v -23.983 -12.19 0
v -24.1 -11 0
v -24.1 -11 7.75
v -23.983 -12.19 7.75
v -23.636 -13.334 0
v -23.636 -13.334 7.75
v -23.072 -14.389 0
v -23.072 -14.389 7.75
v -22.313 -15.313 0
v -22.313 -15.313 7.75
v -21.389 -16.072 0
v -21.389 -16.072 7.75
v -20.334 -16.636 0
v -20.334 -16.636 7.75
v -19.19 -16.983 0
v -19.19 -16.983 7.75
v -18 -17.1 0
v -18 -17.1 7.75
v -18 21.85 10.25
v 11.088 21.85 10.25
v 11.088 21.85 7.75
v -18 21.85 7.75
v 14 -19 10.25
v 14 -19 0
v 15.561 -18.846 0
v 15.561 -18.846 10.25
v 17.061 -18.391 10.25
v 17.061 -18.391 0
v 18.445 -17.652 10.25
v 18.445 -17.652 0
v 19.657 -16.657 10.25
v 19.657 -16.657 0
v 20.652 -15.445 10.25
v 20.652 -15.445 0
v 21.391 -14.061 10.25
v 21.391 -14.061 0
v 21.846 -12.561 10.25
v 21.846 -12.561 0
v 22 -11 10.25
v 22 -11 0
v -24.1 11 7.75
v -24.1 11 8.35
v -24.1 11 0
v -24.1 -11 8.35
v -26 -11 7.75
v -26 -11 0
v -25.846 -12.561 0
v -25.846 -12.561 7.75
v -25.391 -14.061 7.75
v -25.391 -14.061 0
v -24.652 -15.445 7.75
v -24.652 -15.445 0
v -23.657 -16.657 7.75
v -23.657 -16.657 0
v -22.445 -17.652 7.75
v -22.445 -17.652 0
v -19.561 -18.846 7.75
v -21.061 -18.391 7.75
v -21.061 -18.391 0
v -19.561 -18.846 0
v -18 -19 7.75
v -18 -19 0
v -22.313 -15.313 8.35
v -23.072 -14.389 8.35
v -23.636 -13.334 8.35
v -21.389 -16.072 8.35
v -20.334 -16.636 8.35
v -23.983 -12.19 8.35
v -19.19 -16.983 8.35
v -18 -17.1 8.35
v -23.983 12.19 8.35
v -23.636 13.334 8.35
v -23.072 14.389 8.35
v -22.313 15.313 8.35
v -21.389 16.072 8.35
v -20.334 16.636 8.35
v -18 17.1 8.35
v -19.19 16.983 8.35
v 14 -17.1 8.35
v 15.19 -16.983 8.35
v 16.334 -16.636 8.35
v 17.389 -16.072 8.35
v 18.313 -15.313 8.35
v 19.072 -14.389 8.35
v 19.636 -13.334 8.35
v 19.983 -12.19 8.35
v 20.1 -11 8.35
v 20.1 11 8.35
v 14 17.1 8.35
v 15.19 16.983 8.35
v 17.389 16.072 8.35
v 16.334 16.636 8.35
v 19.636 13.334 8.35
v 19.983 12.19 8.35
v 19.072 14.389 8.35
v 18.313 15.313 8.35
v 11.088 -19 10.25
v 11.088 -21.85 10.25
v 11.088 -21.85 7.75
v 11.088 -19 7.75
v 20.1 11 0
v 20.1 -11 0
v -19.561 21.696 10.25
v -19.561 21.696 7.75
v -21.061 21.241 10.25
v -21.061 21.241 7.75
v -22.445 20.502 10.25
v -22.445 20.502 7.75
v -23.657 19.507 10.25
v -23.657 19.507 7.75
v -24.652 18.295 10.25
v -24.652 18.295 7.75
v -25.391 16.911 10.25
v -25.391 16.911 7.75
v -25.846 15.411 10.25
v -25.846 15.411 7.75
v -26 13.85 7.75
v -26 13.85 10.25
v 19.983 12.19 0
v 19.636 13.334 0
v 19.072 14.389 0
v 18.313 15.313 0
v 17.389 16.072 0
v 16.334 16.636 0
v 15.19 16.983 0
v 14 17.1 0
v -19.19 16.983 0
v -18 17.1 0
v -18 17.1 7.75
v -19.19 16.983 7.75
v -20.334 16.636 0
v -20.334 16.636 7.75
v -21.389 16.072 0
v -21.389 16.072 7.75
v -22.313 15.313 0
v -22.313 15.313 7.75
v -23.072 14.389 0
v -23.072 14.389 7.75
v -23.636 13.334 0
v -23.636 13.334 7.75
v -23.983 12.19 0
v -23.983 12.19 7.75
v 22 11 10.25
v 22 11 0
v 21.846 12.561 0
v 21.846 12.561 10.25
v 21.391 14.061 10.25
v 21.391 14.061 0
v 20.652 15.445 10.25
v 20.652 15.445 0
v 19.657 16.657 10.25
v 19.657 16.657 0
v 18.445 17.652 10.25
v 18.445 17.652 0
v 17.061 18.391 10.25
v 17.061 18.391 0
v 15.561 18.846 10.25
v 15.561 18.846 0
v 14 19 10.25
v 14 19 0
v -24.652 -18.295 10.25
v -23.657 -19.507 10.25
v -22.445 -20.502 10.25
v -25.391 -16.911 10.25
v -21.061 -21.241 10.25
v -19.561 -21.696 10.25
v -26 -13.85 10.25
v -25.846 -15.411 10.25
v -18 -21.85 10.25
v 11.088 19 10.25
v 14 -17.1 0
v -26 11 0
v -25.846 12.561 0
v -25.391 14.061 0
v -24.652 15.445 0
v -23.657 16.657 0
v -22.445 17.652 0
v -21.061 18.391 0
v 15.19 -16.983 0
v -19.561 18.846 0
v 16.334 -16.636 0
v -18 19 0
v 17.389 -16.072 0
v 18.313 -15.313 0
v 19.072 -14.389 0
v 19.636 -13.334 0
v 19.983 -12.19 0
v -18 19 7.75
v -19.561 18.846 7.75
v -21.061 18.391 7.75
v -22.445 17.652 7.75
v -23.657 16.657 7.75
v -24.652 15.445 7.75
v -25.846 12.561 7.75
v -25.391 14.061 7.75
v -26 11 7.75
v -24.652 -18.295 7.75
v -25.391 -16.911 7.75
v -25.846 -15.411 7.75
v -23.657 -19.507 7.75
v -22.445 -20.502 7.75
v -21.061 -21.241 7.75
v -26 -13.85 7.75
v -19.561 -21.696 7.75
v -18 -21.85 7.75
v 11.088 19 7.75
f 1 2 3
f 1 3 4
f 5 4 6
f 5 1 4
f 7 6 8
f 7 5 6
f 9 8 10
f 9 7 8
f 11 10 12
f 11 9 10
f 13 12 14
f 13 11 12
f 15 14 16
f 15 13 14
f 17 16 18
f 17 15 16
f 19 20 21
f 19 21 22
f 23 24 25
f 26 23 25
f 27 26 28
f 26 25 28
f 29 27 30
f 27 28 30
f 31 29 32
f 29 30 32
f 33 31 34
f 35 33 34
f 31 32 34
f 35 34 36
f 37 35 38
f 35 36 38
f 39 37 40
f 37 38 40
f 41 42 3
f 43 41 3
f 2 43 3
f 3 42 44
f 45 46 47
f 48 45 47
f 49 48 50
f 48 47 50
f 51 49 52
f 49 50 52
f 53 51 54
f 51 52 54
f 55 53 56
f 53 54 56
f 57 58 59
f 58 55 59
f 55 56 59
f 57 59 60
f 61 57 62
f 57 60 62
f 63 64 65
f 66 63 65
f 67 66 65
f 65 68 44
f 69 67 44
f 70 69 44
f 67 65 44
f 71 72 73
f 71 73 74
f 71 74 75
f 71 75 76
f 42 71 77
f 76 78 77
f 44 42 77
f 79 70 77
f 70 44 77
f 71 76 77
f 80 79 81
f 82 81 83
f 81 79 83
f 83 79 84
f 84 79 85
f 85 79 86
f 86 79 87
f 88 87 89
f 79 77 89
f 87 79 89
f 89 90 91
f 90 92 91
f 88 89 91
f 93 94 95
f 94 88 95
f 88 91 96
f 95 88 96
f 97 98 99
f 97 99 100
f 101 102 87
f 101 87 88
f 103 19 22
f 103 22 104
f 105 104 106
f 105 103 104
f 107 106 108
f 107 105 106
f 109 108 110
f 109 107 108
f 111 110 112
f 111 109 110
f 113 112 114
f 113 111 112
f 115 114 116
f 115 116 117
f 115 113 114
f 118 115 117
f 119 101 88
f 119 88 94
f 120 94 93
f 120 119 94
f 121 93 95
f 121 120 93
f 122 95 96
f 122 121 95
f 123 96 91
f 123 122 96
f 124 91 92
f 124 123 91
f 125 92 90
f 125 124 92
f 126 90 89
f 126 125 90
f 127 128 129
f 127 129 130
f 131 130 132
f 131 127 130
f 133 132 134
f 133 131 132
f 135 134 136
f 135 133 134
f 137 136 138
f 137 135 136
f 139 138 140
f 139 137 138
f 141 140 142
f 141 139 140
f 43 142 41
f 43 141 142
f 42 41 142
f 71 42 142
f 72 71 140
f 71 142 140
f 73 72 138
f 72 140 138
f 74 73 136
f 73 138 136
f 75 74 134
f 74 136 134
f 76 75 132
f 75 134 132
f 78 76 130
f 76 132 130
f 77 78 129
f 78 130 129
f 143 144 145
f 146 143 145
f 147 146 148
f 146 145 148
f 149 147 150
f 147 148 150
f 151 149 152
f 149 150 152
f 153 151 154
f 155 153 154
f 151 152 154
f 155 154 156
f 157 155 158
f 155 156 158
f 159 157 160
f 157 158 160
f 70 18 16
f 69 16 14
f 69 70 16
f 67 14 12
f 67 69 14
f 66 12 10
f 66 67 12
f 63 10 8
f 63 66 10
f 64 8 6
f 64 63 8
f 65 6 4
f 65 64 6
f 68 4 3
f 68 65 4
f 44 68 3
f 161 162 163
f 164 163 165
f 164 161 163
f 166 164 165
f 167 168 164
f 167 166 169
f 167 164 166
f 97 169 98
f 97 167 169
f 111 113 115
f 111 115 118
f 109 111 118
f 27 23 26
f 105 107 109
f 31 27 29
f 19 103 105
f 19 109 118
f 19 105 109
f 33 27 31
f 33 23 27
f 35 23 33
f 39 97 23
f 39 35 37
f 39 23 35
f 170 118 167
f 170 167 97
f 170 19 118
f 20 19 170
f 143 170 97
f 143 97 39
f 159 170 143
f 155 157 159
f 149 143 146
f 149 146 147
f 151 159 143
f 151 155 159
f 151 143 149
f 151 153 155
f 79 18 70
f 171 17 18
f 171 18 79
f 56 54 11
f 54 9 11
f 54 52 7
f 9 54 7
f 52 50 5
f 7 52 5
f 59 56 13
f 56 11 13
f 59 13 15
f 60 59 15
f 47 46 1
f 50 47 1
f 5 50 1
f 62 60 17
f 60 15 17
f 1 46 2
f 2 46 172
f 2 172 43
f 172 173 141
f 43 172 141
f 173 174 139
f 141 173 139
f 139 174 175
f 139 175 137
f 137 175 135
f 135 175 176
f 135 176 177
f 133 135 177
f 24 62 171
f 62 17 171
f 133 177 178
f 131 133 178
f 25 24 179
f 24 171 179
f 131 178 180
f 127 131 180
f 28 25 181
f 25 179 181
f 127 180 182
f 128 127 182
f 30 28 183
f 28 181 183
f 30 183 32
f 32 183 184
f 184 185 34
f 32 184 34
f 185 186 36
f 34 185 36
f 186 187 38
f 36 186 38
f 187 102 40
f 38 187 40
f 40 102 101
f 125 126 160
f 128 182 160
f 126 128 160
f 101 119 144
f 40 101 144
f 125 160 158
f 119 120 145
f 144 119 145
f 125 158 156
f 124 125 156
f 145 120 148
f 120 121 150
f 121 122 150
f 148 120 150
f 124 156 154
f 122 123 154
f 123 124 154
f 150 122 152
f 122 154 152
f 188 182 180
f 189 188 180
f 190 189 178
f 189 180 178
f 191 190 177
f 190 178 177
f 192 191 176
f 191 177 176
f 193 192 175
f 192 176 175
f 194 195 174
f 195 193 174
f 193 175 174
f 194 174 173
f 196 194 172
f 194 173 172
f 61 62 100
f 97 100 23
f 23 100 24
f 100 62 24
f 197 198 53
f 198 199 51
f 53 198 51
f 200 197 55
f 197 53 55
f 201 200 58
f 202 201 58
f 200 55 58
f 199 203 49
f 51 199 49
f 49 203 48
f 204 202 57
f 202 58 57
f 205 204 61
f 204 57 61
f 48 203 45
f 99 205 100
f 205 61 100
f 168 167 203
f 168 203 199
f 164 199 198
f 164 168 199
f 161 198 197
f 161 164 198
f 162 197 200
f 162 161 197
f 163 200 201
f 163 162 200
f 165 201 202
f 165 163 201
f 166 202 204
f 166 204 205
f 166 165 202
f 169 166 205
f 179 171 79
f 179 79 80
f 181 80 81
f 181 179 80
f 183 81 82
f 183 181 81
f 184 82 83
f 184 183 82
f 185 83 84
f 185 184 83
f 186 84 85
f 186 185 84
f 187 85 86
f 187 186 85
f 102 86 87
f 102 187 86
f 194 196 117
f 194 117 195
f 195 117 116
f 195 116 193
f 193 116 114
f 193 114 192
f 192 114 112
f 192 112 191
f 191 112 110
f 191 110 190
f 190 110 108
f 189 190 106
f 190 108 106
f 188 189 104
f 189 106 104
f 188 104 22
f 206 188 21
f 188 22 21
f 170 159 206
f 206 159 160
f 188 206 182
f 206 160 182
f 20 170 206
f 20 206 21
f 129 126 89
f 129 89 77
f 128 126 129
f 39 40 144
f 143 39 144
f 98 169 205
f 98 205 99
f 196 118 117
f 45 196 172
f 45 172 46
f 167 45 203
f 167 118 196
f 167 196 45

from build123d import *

# Parameters (mm, degrees)
F1_DEPTH     = 10.25
F3_DEPTH     = 2.5
F5_T         = 1.9
F5_T3_DEPTH  = 32.8875665362
F5_T5_DEPTH  = 6.3
F5_T8_ANGLE  = 90.000000001
F5_T10_ANGLE = 90.000000001


# Not quite as in the source:
# - a shell that OpenCascade refuses in one call is made with other operations: the cavity is built on its own and cut out


with BuildPart() as f1:
    # F0 (on Top) → F1 (new body)
    with BuildSketch(Plane.XY):
        with BuildLine():
            Line((14, 19), (-18, 19))
            ThreePointArc((-18, 19), (-23.6568542495, 16.6568542495), (-26, 11))
            Line((-26, 11), (-26, -11))
            ThreePointArc((-26, -11), (-23.6568542495, -16.6568542495), (-18, -19))
            Line((-18, -19), (14, -19))
            ThreePointArc((14, -19), (19.6568542495, -16.6568542495), (22, -11))
            Line((22, -11), (22, 11))
            ThreePointArc((22, 11), (19.6568542495, 16.6568542495), (14, 19))
        make_face()
    extrude(amount=F1_DEPTH)

    # F2 (on face) → F3 (join)
    with BuildSketch(Plane.XY.offset(10.25)):
        with BuildLine():
            Line((11.0875665362, 21.85), (-18, 21.85))
            ThreePointArc((-18, 21.85), (-23.6568542495, 19.5068542495), (-26, 13.85))
            Line((-26, 13.85), (-26, -13.85))
            ThreePointArc((-26, -13.85), (-23.6568542495, -19.5068542495), (-18, -21.85))
            Line((-18, -21.85), (11.0875665362, -21.85))
            Line((11.0875665362, -21.85), (11.0875665362, 21.85))
        make_face()
    extrude(amount=-F3_DEPTH)

    # F5: shell of thickness 1.9, made by hand


with BuildPart() as f5_core1:
    # F5_t2: copy of F1
    add(f1.part)

    # the walls: a layer under each face that stays
    f5_faces = [f5_core1.faces().sort_by_distance(p)[0] for p in [
        (-2, 19, 5.125),
        (19.6568542495, 16.6568542495, 5.125),
        (22, 0, 5.125),
        (19.6568542495, -16.6568542495, 5.125),
        (-2, -19, 5.125),
        (-23.6568542495, -16.6568542495, 3.875),
        (-26, 0, 5.125),
        (-23.6568542495, -19.5068542495, 9),
        (-3.4562167319, -21.85, 9),
        (-23.6568542495, 19.5068542495, 9),
        (-3.4562167319, 21.85, 9),
        (-19.8187389106, -20.0416666667, 7.75),
        (11.0875665362, -20.425, 9),
        (-2, 0, 10.25),
        (11.0875665362, 20.425, 9),
        (-19.8187389106, 20.0416666667, 7.75),
        (-23.6568542495, 16.6568542495, 3.875),
    ]]
    thicken(f5_faces, amount=-F5_T, mode=Mode.SUBTRACT)

    # F5_s4 → F5_t3 (cut)
    with BuildSketch(Plane.YZ.offset(-19.9)):
        Polygon((19.019, 7.731), (17.1, 7.75), (17.1, 9.65), (19, 9.65), align=None)
        Polygon((-19.019, 7.731), (-17.1, 7.75), (-17.1, 9.65), (-19, 9.65), align=None)
    extrude(amount=F5_T3_DEPTH, mode=Mode.SUBTRACT)

    # F5_s6 → F5_t5 (cut)
    with BuildSketch(Plane.XY.offset(5.85)):
        Polygon((11.1065665362, 19.019), (11.0875665362, 17.1), (9.1875665362, 17.1), (9.1875665362, 19), align=None)
        Polygon((11.1065665362, -19.019), (11.0875665362, -17.1), (9.1875665362, -17.1), (9.1875665362, -19), align=None)
    extrude(amount=F5_T5_DEPTH, mode=Mode.SUBTRACT)

    # F5_s7 → F5_t8 (revolve, cut)
    with BuildSketch(Plane.YZ.offset(-18)):
        Polygon((-19.019, 7.731), (-17.1, 7.75), (-17.1, 9.65), (-19, 9.65), align=None)
    revolve(axis=Axis((-18, -11, 7.75), (0, 0, -1)), revolution_arc=F5_T8_ANGLE, mode=Mode.SUBTRACT)

    # F5_s9 → F5_t10 (revolve, cut)
    with BuildSketch(Plane.XZ.offset(-11)):
        Polygon((-26.019, 7.731), (-26, 9.65), (-24.1, 9.65), (-24.1, 7.75), align=None)
    revolve(axis=Axis((-18, 11, 7.75), (0, 0, -1)), revolution_arc=F5_T10_ANGLE, mode=Mode.SUBTRACT)


with BuildPart() as f1_1:
    add(f1.part)

    # what is left inside the walls is the cavity
    f5_cavity = [f5_core1.part.solids().sort_by_distance(p)[0] for p in [
        (-2, -5.7, 0.019),
    ]]
    add(f5_cavity, mode=Mode.SUBTRACT)


solid = f1_1.part
